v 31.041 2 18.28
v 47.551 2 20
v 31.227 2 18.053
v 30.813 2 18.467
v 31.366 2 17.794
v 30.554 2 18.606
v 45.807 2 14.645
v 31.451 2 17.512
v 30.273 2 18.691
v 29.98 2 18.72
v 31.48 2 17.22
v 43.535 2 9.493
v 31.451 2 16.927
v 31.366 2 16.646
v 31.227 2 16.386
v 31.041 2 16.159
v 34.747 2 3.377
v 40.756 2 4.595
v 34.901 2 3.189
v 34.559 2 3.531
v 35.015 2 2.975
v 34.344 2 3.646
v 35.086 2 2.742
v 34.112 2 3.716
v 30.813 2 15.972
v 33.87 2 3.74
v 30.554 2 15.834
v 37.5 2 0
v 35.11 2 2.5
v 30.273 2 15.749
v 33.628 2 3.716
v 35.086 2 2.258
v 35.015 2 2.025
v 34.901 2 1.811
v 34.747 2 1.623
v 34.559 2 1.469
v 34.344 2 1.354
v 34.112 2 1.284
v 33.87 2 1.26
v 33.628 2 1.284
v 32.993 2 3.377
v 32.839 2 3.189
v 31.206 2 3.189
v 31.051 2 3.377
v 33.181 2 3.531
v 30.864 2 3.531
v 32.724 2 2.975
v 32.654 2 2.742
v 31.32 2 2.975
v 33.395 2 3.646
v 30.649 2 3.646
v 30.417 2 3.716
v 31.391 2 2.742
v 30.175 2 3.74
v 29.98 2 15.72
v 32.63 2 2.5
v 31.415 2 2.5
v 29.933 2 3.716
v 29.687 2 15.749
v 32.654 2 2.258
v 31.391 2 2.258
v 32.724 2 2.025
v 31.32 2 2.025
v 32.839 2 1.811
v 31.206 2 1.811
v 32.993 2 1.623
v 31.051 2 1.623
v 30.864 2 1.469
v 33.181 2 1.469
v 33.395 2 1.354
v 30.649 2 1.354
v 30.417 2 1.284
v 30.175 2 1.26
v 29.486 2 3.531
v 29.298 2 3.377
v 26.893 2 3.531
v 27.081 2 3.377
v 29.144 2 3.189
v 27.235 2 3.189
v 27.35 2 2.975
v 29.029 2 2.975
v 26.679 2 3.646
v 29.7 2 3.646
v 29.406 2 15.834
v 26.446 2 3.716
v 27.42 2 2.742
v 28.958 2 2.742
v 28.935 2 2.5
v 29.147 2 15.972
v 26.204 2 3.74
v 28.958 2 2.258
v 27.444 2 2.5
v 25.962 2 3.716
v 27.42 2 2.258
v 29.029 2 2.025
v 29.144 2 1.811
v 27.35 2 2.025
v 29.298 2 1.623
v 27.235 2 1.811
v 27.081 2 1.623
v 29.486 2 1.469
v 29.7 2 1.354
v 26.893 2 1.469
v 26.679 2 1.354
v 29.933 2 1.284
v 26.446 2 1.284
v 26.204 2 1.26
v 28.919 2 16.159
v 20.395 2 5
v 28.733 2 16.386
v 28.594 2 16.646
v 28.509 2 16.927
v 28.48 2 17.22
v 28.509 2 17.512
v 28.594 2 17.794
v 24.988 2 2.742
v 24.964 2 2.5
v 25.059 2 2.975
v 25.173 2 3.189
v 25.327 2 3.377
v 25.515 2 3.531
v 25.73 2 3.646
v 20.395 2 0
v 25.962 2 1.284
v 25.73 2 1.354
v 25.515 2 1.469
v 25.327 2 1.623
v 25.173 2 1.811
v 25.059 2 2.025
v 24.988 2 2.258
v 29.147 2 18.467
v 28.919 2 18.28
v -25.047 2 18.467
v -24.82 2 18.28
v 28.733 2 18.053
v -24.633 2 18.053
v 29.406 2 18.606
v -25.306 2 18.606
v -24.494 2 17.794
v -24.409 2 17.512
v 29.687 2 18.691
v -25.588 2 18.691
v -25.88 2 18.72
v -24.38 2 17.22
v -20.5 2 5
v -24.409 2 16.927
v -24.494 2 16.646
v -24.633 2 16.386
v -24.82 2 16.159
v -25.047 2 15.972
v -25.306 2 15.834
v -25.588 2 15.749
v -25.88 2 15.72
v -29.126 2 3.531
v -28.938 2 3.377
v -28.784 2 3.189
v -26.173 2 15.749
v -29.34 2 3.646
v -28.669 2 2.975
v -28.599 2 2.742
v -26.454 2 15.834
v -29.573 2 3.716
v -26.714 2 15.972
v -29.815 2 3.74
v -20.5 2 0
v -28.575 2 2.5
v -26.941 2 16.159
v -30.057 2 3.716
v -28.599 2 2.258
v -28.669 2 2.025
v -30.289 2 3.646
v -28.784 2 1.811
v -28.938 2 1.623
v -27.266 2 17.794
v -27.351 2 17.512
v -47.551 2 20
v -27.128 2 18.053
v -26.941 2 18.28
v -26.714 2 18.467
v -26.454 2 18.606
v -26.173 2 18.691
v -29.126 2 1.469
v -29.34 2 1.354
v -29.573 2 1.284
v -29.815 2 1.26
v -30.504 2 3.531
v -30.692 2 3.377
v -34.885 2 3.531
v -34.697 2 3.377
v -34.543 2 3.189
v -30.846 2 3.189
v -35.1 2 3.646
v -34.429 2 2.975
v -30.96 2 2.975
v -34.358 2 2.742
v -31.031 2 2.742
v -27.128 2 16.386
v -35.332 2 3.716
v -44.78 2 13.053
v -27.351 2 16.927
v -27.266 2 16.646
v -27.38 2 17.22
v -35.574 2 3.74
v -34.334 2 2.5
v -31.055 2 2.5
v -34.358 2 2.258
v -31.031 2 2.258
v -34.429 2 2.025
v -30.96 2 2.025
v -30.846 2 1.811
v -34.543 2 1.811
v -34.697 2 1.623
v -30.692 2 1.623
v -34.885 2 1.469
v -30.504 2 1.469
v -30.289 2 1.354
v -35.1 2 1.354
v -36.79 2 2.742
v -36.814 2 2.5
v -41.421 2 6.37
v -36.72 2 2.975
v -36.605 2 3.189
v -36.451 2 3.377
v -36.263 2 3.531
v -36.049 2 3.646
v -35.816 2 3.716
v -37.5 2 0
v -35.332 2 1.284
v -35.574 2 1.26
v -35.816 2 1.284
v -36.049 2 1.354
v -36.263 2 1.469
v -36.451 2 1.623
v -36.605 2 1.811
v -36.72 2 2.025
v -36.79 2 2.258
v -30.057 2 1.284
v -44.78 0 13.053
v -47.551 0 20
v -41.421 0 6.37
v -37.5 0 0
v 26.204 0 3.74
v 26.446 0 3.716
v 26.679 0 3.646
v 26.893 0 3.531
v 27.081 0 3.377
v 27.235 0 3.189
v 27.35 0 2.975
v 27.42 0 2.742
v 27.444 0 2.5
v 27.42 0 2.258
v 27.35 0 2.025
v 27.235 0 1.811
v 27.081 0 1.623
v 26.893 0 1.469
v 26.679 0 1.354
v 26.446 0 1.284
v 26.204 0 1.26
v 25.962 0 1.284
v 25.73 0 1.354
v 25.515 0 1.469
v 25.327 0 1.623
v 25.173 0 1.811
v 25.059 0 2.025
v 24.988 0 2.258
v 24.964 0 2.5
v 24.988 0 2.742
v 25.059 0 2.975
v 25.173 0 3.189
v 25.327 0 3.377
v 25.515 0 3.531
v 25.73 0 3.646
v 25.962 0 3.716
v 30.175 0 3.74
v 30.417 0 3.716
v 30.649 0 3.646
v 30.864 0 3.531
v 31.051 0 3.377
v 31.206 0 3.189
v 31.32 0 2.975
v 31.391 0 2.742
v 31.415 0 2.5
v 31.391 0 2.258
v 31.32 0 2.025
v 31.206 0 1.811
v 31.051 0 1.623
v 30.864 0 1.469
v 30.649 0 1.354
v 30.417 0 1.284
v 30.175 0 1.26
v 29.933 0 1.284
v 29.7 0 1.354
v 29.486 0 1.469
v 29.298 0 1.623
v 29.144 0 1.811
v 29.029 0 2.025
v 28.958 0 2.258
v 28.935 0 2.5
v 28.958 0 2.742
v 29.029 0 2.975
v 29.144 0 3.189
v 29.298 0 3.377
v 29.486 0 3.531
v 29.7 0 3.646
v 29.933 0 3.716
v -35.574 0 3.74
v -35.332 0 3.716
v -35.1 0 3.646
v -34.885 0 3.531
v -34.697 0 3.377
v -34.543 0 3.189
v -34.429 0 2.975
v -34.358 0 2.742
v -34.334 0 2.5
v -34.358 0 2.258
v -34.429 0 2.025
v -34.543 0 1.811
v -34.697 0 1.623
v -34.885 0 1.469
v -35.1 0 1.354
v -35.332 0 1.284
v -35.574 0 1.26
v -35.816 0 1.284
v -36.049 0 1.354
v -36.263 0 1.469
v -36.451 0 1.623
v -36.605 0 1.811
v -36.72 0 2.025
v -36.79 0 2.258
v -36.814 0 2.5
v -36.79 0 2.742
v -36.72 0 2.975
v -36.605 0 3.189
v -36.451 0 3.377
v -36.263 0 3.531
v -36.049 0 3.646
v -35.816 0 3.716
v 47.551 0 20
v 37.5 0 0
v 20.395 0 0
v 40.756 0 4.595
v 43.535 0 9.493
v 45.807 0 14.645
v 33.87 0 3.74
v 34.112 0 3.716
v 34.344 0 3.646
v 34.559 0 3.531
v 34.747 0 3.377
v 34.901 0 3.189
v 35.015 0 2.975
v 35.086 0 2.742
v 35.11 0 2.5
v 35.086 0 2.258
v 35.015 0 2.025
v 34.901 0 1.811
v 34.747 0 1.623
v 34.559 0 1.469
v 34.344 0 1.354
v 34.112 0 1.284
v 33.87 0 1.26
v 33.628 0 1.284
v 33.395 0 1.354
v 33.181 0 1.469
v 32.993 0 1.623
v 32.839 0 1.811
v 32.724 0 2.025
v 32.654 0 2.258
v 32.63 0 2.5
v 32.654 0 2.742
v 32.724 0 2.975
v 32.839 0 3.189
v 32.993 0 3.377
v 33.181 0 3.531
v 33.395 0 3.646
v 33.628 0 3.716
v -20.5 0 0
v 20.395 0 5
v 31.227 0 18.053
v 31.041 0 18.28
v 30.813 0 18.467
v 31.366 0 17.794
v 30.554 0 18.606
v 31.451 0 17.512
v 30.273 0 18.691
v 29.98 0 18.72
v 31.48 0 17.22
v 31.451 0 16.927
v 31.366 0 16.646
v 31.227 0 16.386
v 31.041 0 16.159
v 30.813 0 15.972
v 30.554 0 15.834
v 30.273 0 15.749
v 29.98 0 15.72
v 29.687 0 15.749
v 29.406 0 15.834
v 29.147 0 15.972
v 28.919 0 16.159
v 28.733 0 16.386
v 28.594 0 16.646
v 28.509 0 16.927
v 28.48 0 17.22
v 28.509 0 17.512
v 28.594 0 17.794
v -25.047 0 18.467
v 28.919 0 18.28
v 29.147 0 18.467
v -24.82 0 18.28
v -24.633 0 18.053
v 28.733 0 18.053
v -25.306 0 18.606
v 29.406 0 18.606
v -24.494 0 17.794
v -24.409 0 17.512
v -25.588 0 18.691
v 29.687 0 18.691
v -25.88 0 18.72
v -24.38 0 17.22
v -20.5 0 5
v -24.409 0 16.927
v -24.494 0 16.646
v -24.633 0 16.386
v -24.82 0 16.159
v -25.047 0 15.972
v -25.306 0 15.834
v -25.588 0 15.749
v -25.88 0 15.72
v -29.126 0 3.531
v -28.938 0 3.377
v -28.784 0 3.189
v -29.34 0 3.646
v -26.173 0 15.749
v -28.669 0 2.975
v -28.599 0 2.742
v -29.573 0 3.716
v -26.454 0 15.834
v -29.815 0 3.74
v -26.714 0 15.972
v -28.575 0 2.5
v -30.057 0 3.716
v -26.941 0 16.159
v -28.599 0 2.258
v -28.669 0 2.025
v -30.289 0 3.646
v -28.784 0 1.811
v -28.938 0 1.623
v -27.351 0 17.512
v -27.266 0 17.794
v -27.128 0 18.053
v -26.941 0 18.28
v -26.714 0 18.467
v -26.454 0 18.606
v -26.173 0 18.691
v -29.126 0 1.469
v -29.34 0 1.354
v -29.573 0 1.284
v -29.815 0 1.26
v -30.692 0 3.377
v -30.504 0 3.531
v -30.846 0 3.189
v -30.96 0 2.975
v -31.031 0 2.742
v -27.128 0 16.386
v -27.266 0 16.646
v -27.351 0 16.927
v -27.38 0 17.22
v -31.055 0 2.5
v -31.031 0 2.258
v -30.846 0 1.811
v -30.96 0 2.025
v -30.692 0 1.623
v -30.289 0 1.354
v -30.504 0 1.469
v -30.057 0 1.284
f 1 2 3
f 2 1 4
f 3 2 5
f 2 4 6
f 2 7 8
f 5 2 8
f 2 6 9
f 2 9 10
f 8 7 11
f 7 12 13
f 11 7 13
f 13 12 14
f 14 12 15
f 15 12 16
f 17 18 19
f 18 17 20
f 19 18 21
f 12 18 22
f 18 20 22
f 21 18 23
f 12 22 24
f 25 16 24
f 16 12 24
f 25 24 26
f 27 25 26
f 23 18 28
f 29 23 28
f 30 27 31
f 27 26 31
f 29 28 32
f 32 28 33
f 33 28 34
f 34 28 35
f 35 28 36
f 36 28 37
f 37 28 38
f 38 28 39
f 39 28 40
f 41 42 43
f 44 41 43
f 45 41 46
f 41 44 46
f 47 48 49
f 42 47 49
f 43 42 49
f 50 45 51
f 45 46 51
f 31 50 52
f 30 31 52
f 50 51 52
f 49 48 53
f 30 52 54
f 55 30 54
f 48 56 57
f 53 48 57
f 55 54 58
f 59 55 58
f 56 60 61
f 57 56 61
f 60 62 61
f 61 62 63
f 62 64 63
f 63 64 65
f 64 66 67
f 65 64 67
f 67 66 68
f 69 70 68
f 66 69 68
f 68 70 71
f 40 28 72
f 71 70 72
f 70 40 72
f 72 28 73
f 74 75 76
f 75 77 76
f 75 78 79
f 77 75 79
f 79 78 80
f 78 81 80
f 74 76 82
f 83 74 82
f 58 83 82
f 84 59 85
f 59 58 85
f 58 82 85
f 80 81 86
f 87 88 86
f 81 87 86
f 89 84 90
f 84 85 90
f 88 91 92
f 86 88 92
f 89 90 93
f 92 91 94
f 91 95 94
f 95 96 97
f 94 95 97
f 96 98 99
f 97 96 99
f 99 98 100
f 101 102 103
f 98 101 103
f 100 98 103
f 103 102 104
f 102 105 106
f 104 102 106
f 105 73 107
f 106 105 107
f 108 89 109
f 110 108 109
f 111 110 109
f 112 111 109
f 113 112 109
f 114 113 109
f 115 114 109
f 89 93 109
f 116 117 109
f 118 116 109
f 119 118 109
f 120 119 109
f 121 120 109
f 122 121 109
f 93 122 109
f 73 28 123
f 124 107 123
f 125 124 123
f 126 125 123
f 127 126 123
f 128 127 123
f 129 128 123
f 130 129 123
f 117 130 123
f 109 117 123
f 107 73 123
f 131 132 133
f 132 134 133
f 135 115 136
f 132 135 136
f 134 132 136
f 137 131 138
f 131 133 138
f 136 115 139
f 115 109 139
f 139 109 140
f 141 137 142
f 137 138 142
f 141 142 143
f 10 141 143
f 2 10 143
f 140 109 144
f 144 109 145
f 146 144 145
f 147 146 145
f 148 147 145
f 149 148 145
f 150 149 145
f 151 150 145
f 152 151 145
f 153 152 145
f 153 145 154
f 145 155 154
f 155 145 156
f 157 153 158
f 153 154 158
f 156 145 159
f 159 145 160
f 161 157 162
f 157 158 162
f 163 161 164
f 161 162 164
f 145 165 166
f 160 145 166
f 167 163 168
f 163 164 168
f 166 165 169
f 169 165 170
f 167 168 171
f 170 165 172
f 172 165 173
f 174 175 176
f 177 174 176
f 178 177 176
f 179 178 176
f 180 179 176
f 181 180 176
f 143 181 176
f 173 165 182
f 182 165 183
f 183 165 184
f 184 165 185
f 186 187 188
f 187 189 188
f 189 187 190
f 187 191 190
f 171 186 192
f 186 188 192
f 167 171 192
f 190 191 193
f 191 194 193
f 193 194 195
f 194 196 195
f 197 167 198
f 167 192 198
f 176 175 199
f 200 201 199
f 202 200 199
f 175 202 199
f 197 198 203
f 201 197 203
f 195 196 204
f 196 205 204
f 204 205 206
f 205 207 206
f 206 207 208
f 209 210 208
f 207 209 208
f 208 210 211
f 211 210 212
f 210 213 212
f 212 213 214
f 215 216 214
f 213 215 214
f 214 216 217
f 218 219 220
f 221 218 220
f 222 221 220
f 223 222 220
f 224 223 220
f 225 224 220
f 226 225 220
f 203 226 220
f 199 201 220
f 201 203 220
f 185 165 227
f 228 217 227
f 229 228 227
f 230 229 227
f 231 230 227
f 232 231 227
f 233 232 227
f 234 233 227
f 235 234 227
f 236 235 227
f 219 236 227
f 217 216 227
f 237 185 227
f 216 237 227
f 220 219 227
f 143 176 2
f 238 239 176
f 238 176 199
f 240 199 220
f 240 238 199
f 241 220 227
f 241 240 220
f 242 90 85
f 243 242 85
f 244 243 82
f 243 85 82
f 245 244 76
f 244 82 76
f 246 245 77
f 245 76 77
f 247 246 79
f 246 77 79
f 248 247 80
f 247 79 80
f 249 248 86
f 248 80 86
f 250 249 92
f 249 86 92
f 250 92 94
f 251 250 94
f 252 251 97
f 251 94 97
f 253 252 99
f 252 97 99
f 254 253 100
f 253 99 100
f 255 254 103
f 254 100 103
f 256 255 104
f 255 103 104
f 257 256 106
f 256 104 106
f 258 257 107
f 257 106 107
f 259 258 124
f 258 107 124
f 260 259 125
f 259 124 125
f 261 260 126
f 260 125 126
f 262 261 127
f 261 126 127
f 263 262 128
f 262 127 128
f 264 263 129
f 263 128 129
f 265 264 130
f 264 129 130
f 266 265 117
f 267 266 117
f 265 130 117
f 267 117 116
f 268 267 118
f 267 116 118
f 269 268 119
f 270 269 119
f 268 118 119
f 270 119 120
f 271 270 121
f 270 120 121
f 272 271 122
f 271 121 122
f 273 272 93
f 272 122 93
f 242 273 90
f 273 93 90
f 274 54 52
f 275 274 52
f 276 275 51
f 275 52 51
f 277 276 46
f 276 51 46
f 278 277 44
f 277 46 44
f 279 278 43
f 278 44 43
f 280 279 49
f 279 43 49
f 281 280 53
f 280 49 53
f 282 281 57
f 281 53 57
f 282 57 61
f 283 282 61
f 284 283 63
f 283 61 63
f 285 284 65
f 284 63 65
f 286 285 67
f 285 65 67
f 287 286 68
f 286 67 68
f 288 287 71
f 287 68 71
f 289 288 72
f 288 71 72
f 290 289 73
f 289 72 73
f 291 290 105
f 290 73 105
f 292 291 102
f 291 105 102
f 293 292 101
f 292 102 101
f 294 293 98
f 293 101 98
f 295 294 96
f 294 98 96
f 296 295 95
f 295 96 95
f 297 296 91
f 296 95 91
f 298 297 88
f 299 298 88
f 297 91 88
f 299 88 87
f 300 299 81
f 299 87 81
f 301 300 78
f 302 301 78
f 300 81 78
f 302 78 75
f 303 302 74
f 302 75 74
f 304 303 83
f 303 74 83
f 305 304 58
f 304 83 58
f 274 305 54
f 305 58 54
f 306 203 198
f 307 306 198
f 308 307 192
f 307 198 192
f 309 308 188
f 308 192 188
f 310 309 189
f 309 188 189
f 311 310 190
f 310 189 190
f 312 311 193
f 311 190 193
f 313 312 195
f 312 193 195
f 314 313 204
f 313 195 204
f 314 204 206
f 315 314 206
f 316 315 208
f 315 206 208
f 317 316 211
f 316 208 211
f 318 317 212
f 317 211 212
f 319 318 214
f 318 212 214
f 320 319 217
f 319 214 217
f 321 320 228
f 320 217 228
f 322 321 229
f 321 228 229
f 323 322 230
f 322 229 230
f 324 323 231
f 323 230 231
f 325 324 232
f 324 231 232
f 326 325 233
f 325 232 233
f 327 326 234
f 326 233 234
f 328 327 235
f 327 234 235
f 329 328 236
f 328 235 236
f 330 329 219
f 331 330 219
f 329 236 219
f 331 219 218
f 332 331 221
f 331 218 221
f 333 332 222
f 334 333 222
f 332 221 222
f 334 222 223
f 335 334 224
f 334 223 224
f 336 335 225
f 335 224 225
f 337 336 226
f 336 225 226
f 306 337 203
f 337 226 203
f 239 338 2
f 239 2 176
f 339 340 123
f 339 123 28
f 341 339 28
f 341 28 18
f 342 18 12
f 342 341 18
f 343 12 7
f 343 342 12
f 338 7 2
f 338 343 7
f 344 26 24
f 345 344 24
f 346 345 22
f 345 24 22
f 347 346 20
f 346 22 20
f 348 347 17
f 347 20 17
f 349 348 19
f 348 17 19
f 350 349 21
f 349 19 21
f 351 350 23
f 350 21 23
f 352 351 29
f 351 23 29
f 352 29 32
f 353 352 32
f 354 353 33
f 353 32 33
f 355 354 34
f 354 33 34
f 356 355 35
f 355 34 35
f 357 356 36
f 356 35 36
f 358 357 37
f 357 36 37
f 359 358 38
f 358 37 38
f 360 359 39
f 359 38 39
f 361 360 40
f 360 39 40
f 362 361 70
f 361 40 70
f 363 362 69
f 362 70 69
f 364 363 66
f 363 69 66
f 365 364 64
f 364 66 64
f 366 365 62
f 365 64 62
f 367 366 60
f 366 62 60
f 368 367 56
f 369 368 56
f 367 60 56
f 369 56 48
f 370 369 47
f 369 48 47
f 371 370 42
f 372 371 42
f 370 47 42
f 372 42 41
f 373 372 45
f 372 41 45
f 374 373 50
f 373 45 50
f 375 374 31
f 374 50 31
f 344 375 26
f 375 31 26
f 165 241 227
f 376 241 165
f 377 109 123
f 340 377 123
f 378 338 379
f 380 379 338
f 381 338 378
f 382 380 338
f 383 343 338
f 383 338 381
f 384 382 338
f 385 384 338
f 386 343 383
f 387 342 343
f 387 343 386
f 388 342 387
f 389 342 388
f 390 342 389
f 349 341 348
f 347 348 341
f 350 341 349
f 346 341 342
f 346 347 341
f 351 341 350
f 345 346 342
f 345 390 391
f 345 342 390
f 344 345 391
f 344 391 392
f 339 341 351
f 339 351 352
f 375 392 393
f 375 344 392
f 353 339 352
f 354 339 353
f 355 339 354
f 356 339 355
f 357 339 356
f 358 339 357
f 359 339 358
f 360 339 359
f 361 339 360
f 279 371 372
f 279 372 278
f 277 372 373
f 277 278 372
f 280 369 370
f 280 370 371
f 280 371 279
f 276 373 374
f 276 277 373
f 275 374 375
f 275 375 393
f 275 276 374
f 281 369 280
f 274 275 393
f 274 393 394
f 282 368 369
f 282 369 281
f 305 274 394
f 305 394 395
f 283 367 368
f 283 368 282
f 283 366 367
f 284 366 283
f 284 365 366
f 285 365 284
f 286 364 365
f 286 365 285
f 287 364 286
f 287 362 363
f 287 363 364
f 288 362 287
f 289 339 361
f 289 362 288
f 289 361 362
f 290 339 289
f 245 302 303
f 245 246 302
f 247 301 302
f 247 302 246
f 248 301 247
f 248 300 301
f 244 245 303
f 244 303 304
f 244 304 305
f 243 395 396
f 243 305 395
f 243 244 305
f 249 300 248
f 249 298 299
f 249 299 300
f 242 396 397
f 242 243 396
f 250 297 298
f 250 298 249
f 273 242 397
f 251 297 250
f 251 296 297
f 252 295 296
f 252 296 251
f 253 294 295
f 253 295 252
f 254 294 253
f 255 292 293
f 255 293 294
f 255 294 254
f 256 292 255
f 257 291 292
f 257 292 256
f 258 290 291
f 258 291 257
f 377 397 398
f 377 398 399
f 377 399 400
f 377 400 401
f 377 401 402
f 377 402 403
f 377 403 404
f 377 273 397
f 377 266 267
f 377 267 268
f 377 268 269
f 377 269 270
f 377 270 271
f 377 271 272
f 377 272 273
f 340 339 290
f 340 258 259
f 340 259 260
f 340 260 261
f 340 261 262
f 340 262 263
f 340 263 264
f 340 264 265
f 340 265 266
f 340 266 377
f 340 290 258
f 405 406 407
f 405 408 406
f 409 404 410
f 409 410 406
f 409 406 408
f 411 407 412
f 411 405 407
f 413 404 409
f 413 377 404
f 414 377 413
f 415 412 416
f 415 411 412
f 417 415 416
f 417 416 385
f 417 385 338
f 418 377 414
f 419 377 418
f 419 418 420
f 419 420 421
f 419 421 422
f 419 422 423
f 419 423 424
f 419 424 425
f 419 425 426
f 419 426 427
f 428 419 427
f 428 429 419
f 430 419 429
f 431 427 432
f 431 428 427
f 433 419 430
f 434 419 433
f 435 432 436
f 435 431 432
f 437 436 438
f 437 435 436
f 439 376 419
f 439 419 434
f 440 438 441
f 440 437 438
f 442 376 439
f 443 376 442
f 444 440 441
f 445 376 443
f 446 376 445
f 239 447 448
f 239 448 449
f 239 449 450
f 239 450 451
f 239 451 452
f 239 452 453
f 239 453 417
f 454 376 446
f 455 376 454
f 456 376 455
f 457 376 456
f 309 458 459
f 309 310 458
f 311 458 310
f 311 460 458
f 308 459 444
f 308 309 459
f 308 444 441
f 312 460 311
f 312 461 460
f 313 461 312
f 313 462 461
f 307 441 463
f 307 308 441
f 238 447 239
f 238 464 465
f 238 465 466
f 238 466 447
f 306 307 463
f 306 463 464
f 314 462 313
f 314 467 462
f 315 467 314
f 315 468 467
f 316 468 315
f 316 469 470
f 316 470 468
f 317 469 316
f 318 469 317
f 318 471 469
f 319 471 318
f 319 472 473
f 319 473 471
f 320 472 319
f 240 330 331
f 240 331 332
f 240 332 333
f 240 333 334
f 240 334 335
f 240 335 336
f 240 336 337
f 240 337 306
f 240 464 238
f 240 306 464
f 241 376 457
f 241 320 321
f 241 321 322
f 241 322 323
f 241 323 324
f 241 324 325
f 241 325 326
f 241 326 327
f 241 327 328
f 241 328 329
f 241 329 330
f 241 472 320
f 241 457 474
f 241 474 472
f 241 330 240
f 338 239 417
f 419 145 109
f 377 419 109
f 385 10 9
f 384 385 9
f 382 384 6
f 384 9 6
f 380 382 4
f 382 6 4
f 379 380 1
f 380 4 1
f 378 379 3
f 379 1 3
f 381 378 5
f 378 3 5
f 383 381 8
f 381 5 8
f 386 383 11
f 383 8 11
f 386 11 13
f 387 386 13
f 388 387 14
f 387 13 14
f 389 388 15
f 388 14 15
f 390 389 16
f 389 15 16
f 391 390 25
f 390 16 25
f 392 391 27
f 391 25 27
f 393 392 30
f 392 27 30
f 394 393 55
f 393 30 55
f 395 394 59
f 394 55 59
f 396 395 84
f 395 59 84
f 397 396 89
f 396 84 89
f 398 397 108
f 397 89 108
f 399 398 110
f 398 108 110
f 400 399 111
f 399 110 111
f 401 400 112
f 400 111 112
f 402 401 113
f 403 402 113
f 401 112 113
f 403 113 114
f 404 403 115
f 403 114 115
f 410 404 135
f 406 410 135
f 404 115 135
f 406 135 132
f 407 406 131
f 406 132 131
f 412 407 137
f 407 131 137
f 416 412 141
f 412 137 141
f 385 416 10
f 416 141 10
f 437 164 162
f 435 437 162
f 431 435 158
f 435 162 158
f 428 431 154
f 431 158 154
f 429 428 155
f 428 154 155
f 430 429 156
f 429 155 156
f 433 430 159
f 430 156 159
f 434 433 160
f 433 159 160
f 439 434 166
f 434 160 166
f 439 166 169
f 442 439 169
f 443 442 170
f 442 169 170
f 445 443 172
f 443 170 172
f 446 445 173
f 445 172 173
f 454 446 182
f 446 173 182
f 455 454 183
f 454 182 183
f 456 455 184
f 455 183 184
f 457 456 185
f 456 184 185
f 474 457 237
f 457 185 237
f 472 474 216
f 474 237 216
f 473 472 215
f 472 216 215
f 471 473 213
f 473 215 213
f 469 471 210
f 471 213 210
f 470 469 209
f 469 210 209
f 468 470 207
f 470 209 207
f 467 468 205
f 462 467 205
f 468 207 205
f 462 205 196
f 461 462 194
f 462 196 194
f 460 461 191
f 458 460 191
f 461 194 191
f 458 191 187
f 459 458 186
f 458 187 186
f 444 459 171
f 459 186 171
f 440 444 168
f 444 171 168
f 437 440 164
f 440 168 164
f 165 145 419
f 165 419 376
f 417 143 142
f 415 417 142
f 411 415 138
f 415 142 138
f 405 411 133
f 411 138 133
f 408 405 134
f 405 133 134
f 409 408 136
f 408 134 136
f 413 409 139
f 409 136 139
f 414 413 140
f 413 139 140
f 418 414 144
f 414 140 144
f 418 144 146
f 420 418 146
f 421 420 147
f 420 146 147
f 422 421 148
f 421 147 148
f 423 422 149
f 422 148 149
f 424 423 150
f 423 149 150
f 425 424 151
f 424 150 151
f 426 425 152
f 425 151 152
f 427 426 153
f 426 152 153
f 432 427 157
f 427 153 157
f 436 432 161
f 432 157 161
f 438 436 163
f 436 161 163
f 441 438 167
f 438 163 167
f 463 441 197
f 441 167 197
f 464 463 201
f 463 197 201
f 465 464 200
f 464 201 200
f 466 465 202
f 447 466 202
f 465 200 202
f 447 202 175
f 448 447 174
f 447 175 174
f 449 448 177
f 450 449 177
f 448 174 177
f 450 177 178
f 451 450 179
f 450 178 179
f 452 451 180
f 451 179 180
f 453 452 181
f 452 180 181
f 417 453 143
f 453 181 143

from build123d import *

# Parameters (mm, degrees)
BOSS_EXTRUDE1_DEPTH = 2
SKETCH2_W           = 40.894938579
SKETCH2_H           = 5
CUT_EXTRUDE1_DEPTH  = 2
SKETCH3_R           = 1.24
CUT_EXTRUDE2_DEPTH  = 2
SKETCH4_R           = 1.5
CUT_EXTRUDE3_DEPTH  = 2


with BuildPart() as part:
    # Sketch1 → Boss-Extrude1 (new body)
    with BuildSketch(Plane(origin=(0, 0, 0), x_dir=(1, 0, 0), z_dir=(0, 1, 0))):
        with BuildLine():
            Line((-37.5, 0), (37.5, 0))
            ThreePointArc((37.5, 0), (43.534594906, -9.492944386), (47.551323816, -20))
            Line((47.551323816, -20), (-47.551323816, -20))
            ThreePointArc((-47.551323816, -20), (-43.172342271, -9.675000313), (-37.5, 0))
        make_face()
    extrude(amount=BOSS_EXTRUDE1_DEPTH)

    # Sketch2 → Cut-Extrude1 (cut)
    with BuildSketch(Plane(origin=(0, 2, 0), x_dir=(1, 0, 0), z_dir=(0, 1, 0))):
        with Locations((-0.05253071, -2.5)):
            Rectangle(SKETCH2_W, SKETCH2_H)
    extrude(amount=-CUT_EXTRUDE1_DEPTH, mode=Mode.SUBTRACT)

    # Sketch3 → Cut-Extrude2 (cut)
    with BuildSketch(Plane(origin=(0, 2, 0), x_dir=(1, 0, 0), z_dir=(0, 1, 0))):
        with Locations(Location((-29.814825978, -2.5, 0), (0, 0, 270))):
            Circle(SKETCH3_R)
        with Locations(Location((26.204190081, -2.5, 0), (0, 0, 270))):
            Circle(SKETCH3_R)
        with Locations(Location((-35.574250481, -2.5, 0), (0, 0, 270))):
            Circle(SKETCH3_R)
        with Locations(Location((30.174605265, -2.5, 0), (0, 0, 270))):
            Circle(SKETCH3_R)
        with Locations(Location((33.86984316, -2.5, 0), (0, 0, 270))):
            Circle(SKETCH3_R)
    extrude(amount=-CUT_EXTRUDE2_DEPTH, mode=Mode.SUBTRACT)

    # Sketch4 → Cut-Extrude3 (cut)
    with BuildSketch(Plane(origin=(0, 2, 0), x_dir=(1, 0, 0), z_dir=(0, 1, 0))):
        with Locations(Location((-25.88031453, -17.219701094, 0), (0, 0, 270))):
            Circle(SKETCH4_R)
        with Locations(Location((29.979925966, -17.219701094, 0), (0, 0, 270))):
            Circle(SKETCH4_R)
    extrude(amount=-CUT_EXTRUDE3_DEPTH, mode=Mode.SUBTRACT)


solid = part.part
